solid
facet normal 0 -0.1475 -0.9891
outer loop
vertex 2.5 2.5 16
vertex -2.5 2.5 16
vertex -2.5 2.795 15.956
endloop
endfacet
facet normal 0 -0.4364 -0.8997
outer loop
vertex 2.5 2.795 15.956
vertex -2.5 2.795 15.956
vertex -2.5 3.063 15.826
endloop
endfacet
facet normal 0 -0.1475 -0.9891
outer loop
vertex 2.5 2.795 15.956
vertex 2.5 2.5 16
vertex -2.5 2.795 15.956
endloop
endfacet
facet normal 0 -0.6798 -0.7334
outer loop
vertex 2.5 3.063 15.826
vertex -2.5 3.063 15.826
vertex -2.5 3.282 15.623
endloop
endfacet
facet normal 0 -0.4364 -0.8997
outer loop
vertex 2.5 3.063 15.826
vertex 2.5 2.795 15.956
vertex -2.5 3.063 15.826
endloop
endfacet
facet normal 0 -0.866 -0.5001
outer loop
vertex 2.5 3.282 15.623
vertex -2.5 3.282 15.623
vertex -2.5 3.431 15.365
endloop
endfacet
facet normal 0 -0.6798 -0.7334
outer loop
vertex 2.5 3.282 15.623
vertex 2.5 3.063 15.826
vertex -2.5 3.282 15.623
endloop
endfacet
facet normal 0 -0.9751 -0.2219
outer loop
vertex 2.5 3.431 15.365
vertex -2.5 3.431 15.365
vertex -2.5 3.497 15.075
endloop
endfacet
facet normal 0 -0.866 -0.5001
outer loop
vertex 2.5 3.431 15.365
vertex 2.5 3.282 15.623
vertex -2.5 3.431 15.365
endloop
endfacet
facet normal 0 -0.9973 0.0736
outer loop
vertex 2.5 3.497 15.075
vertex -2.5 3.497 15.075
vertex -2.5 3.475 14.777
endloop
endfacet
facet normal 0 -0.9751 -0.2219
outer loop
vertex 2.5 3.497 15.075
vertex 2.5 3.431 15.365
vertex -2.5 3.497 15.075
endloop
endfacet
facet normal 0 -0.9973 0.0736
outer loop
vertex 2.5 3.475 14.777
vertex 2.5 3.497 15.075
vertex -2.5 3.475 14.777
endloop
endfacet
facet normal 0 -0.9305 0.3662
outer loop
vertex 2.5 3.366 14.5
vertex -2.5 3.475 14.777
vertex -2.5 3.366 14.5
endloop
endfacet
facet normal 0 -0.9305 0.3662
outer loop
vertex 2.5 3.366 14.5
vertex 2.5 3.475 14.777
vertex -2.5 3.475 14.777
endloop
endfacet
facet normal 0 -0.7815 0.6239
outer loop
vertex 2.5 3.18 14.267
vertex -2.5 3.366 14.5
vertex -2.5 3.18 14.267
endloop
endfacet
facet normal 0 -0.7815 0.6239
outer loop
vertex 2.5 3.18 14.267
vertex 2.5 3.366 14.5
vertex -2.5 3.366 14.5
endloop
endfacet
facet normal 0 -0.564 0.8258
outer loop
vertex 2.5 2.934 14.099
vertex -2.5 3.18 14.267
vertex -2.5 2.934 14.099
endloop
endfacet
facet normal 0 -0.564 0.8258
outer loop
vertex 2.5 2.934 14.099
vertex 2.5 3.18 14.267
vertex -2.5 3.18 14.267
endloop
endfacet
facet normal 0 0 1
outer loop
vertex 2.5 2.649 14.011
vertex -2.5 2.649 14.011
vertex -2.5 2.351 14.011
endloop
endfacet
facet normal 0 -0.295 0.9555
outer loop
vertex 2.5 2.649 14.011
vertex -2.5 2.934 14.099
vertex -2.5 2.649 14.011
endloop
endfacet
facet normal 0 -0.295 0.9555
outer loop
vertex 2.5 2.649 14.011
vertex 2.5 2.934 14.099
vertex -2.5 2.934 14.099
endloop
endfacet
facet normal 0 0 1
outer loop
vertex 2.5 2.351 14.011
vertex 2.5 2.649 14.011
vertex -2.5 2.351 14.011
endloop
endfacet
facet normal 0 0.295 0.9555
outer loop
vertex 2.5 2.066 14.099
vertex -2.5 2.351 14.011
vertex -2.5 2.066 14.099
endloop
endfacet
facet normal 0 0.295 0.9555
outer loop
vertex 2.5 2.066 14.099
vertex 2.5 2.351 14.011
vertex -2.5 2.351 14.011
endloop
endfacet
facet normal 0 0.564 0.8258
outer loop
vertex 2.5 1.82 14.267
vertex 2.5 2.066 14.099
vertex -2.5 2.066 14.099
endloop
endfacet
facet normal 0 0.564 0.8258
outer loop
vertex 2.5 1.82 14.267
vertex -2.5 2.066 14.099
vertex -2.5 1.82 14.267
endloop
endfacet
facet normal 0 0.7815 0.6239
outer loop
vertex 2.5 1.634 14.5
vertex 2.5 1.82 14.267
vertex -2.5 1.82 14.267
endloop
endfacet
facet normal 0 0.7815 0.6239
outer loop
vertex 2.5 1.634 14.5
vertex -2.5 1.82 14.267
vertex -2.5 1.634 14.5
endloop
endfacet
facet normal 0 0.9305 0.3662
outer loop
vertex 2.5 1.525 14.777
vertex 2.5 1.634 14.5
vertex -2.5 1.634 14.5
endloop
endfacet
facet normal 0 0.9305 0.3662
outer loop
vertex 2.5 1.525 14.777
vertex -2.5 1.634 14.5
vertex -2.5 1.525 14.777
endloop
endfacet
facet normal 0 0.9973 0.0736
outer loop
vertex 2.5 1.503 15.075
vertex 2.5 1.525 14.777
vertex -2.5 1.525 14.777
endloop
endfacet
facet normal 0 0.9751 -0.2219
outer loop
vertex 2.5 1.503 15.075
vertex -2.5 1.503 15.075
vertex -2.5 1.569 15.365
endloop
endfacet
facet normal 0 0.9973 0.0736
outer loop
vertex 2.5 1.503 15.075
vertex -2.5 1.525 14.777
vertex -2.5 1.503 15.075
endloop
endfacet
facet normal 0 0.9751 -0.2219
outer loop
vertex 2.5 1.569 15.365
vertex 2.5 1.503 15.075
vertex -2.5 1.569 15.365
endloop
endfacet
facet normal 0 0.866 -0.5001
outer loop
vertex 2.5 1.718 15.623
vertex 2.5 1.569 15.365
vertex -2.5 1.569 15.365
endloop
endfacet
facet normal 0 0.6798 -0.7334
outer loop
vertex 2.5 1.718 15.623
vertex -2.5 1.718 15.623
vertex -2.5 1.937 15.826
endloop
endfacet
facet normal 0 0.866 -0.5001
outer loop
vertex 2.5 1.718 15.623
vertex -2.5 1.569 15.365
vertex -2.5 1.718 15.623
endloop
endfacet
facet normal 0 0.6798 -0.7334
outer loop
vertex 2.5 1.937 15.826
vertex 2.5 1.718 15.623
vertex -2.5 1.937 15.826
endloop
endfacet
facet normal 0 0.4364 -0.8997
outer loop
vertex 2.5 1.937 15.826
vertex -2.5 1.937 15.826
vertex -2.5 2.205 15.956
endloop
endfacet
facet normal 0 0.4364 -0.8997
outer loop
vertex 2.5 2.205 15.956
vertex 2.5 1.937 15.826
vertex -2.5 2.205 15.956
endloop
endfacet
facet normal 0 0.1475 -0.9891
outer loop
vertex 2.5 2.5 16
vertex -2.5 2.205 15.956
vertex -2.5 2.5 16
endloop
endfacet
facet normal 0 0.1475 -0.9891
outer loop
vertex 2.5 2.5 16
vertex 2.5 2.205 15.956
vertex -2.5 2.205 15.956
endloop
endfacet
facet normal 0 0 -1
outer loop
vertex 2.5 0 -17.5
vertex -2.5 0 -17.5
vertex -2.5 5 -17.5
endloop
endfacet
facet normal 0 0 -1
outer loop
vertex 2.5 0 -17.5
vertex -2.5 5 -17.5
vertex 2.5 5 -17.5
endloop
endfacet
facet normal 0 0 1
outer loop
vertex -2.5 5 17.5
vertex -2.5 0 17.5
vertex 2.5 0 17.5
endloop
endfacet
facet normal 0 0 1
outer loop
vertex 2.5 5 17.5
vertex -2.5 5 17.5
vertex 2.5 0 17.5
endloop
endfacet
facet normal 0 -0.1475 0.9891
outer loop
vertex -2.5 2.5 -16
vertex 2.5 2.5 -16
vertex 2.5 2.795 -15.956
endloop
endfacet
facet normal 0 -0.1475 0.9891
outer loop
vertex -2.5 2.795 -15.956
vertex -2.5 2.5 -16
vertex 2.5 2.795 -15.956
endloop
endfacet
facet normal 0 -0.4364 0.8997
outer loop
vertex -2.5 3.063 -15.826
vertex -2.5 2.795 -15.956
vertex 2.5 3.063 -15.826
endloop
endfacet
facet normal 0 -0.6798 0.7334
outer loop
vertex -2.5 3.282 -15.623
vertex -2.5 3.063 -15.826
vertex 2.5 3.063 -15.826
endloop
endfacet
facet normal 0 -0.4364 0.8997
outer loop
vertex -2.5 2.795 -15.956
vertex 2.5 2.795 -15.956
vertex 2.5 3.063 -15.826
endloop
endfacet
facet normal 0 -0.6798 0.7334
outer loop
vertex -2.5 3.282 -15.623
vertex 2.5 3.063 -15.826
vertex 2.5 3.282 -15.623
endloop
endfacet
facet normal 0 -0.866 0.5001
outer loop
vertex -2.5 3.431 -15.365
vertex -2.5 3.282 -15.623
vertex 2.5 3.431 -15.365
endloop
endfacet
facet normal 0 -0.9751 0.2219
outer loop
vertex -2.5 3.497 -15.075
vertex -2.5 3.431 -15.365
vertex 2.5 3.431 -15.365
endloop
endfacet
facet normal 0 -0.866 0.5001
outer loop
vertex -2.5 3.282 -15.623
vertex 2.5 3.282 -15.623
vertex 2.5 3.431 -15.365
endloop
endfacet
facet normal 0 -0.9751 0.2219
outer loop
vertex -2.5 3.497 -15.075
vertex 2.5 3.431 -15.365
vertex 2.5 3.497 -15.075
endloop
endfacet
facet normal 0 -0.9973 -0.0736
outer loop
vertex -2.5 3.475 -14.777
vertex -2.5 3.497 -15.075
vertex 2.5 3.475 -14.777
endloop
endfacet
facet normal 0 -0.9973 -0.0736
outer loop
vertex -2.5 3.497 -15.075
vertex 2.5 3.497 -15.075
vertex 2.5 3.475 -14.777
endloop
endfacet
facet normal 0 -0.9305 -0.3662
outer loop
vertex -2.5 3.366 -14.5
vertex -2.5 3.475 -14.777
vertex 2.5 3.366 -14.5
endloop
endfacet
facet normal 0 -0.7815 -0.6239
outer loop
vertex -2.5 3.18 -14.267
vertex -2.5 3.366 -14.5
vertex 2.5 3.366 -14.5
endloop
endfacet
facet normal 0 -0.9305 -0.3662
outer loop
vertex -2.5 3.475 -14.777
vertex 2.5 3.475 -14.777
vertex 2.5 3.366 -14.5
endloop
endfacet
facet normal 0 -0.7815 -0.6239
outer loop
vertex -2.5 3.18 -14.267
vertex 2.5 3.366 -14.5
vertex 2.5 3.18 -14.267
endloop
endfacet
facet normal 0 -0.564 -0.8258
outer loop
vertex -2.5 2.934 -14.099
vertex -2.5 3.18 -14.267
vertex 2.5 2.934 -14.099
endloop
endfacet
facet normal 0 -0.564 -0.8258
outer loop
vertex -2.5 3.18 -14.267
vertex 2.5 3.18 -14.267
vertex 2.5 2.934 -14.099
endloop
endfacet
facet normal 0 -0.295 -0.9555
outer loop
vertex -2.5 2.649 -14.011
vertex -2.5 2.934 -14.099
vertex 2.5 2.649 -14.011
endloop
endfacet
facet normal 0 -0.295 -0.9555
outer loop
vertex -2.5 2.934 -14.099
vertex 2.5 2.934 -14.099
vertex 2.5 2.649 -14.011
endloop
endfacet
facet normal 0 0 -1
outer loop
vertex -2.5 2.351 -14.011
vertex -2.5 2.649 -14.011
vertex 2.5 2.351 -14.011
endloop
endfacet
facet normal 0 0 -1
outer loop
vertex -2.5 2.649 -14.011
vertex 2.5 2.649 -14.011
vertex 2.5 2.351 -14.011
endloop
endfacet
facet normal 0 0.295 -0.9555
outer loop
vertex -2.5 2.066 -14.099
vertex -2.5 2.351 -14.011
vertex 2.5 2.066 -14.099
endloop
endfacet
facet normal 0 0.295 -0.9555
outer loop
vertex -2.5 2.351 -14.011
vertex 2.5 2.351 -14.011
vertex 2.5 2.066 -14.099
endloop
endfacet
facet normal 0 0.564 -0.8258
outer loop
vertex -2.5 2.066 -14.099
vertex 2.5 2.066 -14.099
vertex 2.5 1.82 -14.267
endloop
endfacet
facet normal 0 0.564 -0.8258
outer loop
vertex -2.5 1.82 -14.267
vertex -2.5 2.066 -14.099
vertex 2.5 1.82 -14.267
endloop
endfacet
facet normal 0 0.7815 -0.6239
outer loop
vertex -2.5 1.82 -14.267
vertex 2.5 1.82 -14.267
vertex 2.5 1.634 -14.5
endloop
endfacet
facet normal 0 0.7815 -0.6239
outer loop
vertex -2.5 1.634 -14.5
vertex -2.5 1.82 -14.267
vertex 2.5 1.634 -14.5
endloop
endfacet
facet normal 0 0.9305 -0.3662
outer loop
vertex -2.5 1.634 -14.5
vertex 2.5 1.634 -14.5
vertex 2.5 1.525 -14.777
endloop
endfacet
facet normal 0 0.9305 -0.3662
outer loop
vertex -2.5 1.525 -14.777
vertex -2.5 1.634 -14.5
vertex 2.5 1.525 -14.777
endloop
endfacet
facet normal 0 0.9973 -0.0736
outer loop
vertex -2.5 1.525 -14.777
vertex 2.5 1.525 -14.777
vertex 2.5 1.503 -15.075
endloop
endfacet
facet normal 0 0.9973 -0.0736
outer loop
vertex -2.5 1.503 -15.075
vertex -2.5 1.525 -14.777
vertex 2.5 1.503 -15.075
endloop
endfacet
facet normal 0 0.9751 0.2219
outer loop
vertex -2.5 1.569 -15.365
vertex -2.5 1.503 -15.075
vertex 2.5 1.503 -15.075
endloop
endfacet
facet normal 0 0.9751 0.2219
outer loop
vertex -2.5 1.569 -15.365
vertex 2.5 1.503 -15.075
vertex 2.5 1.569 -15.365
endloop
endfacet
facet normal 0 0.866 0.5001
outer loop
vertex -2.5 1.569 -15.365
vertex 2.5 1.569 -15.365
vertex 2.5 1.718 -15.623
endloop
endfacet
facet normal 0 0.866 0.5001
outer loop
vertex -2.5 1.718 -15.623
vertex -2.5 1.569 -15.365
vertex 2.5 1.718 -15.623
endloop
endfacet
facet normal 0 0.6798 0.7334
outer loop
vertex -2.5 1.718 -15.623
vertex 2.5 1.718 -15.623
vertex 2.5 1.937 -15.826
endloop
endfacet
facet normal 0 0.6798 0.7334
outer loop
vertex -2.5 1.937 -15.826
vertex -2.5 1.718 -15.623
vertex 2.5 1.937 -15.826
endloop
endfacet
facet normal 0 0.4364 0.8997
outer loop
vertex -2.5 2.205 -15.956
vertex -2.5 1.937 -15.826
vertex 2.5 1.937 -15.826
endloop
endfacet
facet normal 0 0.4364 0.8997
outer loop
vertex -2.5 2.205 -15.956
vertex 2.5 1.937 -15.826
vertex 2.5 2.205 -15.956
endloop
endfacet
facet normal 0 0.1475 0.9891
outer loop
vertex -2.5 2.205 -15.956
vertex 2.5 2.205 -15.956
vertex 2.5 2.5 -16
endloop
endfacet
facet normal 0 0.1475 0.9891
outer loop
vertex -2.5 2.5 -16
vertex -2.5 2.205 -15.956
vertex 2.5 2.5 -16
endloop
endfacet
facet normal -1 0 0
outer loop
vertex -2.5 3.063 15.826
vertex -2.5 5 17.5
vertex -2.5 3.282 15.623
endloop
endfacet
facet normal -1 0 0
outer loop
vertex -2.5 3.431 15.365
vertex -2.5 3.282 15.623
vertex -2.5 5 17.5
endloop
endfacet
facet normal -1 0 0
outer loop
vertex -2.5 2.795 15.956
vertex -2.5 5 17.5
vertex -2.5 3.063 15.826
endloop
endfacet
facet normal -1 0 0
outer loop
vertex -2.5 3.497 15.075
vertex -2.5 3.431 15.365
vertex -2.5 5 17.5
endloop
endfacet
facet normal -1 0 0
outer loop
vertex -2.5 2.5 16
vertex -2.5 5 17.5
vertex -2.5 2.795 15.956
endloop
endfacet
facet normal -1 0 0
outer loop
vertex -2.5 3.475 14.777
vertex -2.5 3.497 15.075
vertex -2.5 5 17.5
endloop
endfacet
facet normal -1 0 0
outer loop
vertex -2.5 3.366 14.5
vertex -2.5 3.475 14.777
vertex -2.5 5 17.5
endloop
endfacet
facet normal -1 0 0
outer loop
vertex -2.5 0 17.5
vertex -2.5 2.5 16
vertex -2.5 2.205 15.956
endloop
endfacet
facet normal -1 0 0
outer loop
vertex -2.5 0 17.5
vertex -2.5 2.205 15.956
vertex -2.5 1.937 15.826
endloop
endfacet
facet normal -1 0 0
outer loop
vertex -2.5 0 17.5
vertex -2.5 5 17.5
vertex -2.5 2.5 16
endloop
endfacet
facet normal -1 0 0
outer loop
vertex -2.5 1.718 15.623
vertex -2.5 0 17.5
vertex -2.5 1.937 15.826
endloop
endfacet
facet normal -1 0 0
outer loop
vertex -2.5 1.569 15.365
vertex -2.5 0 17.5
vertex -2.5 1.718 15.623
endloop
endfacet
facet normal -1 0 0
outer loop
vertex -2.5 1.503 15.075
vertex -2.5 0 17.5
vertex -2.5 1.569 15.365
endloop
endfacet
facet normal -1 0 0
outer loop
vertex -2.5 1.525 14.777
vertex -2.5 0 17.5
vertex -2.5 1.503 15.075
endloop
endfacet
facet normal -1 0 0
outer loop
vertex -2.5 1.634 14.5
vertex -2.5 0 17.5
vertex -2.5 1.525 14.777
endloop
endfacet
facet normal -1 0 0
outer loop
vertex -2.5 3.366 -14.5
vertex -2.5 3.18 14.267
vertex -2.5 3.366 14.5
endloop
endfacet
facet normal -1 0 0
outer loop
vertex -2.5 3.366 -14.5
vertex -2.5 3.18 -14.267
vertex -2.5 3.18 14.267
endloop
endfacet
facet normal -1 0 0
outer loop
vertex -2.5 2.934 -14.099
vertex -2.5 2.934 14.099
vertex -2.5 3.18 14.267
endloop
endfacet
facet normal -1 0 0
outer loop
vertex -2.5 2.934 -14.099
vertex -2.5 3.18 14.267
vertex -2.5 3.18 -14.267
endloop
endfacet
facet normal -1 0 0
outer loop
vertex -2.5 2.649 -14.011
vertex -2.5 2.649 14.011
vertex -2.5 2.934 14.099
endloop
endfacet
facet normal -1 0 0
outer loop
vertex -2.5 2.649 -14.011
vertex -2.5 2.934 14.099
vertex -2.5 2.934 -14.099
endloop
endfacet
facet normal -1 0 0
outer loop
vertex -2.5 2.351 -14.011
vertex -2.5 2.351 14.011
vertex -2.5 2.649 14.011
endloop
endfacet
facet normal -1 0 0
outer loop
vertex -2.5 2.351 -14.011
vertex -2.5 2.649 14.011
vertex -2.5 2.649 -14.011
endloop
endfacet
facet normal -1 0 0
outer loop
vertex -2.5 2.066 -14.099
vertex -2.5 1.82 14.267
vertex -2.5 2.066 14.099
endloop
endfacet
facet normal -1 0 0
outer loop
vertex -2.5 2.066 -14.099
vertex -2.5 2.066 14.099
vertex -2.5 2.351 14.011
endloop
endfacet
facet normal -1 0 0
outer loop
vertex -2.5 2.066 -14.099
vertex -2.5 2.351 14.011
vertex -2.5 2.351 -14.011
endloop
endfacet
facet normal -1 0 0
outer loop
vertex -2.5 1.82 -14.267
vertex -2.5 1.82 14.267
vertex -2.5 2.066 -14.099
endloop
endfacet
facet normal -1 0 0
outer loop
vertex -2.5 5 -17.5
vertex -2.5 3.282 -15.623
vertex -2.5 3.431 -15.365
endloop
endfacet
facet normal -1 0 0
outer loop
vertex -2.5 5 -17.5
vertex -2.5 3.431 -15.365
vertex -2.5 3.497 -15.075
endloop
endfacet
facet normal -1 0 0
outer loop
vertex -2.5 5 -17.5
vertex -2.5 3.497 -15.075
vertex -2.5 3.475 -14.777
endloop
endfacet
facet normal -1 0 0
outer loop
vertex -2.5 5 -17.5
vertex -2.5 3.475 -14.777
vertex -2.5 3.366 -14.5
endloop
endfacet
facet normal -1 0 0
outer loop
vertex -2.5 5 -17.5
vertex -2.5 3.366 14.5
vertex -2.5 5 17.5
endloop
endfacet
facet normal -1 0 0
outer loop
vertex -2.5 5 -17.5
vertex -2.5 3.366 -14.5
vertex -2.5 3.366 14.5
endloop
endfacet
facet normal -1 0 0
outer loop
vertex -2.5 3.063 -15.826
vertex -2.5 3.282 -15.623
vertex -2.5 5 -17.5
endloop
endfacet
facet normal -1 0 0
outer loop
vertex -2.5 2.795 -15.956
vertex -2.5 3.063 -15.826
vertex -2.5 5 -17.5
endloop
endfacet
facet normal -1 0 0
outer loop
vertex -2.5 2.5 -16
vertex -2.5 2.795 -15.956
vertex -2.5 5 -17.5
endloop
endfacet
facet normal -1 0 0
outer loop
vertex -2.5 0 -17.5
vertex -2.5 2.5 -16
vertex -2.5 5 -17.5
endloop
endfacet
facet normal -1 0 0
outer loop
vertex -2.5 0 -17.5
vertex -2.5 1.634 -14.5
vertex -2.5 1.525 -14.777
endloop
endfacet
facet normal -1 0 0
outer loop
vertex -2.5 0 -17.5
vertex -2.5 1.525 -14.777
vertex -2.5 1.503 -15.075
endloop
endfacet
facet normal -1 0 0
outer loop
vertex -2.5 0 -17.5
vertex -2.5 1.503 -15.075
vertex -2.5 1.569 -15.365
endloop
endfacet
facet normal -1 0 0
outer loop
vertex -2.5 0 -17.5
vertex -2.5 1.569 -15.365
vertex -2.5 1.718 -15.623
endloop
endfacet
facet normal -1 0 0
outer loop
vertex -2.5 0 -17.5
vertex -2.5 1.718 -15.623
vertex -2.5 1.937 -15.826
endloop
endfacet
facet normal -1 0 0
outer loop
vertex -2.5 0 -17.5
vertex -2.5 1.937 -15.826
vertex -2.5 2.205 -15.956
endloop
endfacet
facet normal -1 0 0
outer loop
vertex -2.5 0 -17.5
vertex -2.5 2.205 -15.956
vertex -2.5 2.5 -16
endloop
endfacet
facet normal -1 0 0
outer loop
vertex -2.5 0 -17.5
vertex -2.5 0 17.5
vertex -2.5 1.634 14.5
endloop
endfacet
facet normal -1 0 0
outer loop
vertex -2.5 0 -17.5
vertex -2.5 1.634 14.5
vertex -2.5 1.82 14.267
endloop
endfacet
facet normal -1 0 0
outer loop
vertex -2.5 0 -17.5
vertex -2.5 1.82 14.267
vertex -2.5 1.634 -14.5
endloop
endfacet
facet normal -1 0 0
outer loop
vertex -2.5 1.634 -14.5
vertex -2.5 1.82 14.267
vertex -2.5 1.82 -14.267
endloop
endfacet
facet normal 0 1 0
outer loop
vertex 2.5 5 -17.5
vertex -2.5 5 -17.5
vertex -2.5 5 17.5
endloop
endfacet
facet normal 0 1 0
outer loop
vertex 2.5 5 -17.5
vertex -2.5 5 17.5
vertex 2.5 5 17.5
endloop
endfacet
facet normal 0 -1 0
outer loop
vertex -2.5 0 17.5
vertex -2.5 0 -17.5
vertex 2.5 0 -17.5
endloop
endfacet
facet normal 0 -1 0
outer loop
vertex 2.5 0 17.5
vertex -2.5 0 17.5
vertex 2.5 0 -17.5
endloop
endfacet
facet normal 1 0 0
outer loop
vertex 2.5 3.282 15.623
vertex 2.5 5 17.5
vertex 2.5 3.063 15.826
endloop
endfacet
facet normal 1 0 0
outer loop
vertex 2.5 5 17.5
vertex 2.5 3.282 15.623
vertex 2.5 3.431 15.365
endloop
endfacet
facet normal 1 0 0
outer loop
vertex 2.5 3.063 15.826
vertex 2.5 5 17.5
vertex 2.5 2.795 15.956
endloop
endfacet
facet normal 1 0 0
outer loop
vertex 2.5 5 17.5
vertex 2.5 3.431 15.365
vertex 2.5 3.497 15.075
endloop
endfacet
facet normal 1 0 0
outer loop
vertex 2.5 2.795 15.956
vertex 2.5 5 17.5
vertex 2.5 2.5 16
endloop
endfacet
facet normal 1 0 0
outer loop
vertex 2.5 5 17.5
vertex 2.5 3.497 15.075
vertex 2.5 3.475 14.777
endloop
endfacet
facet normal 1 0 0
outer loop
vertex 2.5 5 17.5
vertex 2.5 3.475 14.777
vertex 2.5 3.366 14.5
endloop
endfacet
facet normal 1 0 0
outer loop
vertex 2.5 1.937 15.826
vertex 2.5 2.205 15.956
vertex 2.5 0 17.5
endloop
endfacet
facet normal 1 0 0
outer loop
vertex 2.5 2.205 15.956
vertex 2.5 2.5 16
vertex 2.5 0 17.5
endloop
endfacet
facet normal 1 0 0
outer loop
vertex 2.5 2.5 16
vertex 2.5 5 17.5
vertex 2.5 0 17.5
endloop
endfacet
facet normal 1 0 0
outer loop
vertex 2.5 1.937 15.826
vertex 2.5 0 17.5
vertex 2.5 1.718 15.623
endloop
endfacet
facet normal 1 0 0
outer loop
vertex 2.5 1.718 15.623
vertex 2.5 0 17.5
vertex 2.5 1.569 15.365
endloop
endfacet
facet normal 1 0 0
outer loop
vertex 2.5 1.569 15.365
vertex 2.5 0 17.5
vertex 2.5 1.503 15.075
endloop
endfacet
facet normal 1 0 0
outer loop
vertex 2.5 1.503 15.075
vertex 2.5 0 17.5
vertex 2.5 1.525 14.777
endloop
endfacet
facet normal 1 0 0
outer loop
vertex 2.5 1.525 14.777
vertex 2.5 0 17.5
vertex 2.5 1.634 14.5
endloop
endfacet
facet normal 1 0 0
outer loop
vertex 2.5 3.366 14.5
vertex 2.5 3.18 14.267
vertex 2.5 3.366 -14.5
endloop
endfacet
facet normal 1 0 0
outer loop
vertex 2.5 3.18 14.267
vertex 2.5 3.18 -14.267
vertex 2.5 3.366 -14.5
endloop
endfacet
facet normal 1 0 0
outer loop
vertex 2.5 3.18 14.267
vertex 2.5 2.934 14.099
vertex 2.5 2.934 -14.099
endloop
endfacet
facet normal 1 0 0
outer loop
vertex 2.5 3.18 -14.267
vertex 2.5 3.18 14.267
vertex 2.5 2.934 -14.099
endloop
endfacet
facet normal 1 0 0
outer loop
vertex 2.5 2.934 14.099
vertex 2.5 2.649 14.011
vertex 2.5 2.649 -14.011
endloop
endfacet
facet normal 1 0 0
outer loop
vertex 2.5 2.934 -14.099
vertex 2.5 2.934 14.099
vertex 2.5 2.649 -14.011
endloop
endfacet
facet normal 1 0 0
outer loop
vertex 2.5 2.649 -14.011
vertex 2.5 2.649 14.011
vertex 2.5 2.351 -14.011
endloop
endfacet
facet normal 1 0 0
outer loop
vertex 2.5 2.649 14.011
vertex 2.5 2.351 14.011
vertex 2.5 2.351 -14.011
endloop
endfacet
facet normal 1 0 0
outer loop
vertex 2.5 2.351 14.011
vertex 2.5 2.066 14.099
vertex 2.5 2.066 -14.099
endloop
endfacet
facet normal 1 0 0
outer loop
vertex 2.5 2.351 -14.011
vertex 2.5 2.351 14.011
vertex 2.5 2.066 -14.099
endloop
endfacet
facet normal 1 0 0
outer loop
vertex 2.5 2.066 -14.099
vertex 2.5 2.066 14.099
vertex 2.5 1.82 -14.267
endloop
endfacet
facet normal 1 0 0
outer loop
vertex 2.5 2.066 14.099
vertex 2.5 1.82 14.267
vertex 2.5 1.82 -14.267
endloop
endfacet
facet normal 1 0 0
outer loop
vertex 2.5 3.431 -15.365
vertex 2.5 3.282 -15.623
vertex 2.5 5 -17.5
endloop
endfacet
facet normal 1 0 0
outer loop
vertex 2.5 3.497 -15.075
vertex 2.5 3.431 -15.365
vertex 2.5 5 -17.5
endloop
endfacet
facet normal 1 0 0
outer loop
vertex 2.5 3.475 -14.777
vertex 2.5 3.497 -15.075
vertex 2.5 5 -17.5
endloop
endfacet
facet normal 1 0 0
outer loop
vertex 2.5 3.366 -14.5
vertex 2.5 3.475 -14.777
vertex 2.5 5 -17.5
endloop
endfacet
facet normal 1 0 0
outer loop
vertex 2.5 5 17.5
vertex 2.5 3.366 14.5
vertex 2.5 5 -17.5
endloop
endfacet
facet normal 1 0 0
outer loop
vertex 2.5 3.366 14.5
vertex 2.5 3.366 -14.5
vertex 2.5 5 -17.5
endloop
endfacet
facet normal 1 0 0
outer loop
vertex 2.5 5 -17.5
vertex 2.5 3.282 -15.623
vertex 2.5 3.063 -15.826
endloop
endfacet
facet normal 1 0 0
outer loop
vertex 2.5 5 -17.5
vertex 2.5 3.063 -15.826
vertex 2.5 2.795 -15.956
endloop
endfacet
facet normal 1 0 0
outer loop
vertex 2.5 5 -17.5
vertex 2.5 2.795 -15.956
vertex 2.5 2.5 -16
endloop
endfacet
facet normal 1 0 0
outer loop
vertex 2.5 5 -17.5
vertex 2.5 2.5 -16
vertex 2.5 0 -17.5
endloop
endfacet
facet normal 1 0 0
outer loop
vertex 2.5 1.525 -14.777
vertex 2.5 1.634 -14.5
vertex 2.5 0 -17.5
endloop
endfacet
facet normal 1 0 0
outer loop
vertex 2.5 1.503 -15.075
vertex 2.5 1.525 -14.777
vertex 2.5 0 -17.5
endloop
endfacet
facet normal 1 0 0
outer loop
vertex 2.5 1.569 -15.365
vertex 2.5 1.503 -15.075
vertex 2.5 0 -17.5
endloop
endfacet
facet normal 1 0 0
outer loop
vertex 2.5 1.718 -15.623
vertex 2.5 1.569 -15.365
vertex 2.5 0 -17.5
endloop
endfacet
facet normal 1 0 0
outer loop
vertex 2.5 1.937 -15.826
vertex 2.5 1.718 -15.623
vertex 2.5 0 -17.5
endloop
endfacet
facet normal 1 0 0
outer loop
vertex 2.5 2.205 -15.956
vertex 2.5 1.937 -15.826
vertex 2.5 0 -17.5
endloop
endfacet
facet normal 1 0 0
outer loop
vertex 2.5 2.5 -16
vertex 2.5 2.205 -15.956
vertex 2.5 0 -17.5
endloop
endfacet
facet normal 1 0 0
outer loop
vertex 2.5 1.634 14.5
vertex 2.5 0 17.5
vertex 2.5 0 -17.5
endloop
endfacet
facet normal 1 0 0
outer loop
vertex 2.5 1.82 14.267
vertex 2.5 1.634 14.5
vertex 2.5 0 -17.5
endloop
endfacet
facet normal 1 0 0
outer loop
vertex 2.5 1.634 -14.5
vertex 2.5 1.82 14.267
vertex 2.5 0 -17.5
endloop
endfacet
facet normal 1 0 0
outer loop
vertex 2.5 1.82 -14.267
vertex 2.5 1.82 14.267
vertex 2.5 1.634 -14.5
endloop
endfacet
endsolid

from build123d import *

# Parameters (mm, degrees)
SKETCH1_W           = 5
SKETCH1_H           = 35
BOSS_EXTRUDE1_DEPTH = 5
SKETCH2_R           = 1
CUT_EXTRUDE1_DEPTH  = 19.874586088


with BuildPart() as part:
    # Sketch1 → Boss-Extrude1 (new body)
    with BuildSketch(Plane(origin=(0, 0, 0), x_dir=(1, 0, 0), z_dir=(0, 1, 0))):
        Rectangle(SKETCH1_W, SKETCH1_H)
    extrude(amount=BOSS_EXTRUDE1_DEPTH)

    # Sketch2 → Cut-Extrude1 (cut, through all)
    with BuildSketch(Plane(origin=(2.5, 0, 0), x_dir=(0, 0, -1), z_dir=(1, 0, 0))):
        with Locations((15, 2.5)):
            Circle(SKETCH2_R)
    cut_extrude1 = extrude(amount=-CUT_EXTRUDE1_DEPTH, mode=Mode.SUBTRACT)

    # Mirror1: Cut-Extrude1 across plane
    add(cut_extrude1.mirror(Plane.XY), mode=Mode.SUBTRACT)


solid = part.part
